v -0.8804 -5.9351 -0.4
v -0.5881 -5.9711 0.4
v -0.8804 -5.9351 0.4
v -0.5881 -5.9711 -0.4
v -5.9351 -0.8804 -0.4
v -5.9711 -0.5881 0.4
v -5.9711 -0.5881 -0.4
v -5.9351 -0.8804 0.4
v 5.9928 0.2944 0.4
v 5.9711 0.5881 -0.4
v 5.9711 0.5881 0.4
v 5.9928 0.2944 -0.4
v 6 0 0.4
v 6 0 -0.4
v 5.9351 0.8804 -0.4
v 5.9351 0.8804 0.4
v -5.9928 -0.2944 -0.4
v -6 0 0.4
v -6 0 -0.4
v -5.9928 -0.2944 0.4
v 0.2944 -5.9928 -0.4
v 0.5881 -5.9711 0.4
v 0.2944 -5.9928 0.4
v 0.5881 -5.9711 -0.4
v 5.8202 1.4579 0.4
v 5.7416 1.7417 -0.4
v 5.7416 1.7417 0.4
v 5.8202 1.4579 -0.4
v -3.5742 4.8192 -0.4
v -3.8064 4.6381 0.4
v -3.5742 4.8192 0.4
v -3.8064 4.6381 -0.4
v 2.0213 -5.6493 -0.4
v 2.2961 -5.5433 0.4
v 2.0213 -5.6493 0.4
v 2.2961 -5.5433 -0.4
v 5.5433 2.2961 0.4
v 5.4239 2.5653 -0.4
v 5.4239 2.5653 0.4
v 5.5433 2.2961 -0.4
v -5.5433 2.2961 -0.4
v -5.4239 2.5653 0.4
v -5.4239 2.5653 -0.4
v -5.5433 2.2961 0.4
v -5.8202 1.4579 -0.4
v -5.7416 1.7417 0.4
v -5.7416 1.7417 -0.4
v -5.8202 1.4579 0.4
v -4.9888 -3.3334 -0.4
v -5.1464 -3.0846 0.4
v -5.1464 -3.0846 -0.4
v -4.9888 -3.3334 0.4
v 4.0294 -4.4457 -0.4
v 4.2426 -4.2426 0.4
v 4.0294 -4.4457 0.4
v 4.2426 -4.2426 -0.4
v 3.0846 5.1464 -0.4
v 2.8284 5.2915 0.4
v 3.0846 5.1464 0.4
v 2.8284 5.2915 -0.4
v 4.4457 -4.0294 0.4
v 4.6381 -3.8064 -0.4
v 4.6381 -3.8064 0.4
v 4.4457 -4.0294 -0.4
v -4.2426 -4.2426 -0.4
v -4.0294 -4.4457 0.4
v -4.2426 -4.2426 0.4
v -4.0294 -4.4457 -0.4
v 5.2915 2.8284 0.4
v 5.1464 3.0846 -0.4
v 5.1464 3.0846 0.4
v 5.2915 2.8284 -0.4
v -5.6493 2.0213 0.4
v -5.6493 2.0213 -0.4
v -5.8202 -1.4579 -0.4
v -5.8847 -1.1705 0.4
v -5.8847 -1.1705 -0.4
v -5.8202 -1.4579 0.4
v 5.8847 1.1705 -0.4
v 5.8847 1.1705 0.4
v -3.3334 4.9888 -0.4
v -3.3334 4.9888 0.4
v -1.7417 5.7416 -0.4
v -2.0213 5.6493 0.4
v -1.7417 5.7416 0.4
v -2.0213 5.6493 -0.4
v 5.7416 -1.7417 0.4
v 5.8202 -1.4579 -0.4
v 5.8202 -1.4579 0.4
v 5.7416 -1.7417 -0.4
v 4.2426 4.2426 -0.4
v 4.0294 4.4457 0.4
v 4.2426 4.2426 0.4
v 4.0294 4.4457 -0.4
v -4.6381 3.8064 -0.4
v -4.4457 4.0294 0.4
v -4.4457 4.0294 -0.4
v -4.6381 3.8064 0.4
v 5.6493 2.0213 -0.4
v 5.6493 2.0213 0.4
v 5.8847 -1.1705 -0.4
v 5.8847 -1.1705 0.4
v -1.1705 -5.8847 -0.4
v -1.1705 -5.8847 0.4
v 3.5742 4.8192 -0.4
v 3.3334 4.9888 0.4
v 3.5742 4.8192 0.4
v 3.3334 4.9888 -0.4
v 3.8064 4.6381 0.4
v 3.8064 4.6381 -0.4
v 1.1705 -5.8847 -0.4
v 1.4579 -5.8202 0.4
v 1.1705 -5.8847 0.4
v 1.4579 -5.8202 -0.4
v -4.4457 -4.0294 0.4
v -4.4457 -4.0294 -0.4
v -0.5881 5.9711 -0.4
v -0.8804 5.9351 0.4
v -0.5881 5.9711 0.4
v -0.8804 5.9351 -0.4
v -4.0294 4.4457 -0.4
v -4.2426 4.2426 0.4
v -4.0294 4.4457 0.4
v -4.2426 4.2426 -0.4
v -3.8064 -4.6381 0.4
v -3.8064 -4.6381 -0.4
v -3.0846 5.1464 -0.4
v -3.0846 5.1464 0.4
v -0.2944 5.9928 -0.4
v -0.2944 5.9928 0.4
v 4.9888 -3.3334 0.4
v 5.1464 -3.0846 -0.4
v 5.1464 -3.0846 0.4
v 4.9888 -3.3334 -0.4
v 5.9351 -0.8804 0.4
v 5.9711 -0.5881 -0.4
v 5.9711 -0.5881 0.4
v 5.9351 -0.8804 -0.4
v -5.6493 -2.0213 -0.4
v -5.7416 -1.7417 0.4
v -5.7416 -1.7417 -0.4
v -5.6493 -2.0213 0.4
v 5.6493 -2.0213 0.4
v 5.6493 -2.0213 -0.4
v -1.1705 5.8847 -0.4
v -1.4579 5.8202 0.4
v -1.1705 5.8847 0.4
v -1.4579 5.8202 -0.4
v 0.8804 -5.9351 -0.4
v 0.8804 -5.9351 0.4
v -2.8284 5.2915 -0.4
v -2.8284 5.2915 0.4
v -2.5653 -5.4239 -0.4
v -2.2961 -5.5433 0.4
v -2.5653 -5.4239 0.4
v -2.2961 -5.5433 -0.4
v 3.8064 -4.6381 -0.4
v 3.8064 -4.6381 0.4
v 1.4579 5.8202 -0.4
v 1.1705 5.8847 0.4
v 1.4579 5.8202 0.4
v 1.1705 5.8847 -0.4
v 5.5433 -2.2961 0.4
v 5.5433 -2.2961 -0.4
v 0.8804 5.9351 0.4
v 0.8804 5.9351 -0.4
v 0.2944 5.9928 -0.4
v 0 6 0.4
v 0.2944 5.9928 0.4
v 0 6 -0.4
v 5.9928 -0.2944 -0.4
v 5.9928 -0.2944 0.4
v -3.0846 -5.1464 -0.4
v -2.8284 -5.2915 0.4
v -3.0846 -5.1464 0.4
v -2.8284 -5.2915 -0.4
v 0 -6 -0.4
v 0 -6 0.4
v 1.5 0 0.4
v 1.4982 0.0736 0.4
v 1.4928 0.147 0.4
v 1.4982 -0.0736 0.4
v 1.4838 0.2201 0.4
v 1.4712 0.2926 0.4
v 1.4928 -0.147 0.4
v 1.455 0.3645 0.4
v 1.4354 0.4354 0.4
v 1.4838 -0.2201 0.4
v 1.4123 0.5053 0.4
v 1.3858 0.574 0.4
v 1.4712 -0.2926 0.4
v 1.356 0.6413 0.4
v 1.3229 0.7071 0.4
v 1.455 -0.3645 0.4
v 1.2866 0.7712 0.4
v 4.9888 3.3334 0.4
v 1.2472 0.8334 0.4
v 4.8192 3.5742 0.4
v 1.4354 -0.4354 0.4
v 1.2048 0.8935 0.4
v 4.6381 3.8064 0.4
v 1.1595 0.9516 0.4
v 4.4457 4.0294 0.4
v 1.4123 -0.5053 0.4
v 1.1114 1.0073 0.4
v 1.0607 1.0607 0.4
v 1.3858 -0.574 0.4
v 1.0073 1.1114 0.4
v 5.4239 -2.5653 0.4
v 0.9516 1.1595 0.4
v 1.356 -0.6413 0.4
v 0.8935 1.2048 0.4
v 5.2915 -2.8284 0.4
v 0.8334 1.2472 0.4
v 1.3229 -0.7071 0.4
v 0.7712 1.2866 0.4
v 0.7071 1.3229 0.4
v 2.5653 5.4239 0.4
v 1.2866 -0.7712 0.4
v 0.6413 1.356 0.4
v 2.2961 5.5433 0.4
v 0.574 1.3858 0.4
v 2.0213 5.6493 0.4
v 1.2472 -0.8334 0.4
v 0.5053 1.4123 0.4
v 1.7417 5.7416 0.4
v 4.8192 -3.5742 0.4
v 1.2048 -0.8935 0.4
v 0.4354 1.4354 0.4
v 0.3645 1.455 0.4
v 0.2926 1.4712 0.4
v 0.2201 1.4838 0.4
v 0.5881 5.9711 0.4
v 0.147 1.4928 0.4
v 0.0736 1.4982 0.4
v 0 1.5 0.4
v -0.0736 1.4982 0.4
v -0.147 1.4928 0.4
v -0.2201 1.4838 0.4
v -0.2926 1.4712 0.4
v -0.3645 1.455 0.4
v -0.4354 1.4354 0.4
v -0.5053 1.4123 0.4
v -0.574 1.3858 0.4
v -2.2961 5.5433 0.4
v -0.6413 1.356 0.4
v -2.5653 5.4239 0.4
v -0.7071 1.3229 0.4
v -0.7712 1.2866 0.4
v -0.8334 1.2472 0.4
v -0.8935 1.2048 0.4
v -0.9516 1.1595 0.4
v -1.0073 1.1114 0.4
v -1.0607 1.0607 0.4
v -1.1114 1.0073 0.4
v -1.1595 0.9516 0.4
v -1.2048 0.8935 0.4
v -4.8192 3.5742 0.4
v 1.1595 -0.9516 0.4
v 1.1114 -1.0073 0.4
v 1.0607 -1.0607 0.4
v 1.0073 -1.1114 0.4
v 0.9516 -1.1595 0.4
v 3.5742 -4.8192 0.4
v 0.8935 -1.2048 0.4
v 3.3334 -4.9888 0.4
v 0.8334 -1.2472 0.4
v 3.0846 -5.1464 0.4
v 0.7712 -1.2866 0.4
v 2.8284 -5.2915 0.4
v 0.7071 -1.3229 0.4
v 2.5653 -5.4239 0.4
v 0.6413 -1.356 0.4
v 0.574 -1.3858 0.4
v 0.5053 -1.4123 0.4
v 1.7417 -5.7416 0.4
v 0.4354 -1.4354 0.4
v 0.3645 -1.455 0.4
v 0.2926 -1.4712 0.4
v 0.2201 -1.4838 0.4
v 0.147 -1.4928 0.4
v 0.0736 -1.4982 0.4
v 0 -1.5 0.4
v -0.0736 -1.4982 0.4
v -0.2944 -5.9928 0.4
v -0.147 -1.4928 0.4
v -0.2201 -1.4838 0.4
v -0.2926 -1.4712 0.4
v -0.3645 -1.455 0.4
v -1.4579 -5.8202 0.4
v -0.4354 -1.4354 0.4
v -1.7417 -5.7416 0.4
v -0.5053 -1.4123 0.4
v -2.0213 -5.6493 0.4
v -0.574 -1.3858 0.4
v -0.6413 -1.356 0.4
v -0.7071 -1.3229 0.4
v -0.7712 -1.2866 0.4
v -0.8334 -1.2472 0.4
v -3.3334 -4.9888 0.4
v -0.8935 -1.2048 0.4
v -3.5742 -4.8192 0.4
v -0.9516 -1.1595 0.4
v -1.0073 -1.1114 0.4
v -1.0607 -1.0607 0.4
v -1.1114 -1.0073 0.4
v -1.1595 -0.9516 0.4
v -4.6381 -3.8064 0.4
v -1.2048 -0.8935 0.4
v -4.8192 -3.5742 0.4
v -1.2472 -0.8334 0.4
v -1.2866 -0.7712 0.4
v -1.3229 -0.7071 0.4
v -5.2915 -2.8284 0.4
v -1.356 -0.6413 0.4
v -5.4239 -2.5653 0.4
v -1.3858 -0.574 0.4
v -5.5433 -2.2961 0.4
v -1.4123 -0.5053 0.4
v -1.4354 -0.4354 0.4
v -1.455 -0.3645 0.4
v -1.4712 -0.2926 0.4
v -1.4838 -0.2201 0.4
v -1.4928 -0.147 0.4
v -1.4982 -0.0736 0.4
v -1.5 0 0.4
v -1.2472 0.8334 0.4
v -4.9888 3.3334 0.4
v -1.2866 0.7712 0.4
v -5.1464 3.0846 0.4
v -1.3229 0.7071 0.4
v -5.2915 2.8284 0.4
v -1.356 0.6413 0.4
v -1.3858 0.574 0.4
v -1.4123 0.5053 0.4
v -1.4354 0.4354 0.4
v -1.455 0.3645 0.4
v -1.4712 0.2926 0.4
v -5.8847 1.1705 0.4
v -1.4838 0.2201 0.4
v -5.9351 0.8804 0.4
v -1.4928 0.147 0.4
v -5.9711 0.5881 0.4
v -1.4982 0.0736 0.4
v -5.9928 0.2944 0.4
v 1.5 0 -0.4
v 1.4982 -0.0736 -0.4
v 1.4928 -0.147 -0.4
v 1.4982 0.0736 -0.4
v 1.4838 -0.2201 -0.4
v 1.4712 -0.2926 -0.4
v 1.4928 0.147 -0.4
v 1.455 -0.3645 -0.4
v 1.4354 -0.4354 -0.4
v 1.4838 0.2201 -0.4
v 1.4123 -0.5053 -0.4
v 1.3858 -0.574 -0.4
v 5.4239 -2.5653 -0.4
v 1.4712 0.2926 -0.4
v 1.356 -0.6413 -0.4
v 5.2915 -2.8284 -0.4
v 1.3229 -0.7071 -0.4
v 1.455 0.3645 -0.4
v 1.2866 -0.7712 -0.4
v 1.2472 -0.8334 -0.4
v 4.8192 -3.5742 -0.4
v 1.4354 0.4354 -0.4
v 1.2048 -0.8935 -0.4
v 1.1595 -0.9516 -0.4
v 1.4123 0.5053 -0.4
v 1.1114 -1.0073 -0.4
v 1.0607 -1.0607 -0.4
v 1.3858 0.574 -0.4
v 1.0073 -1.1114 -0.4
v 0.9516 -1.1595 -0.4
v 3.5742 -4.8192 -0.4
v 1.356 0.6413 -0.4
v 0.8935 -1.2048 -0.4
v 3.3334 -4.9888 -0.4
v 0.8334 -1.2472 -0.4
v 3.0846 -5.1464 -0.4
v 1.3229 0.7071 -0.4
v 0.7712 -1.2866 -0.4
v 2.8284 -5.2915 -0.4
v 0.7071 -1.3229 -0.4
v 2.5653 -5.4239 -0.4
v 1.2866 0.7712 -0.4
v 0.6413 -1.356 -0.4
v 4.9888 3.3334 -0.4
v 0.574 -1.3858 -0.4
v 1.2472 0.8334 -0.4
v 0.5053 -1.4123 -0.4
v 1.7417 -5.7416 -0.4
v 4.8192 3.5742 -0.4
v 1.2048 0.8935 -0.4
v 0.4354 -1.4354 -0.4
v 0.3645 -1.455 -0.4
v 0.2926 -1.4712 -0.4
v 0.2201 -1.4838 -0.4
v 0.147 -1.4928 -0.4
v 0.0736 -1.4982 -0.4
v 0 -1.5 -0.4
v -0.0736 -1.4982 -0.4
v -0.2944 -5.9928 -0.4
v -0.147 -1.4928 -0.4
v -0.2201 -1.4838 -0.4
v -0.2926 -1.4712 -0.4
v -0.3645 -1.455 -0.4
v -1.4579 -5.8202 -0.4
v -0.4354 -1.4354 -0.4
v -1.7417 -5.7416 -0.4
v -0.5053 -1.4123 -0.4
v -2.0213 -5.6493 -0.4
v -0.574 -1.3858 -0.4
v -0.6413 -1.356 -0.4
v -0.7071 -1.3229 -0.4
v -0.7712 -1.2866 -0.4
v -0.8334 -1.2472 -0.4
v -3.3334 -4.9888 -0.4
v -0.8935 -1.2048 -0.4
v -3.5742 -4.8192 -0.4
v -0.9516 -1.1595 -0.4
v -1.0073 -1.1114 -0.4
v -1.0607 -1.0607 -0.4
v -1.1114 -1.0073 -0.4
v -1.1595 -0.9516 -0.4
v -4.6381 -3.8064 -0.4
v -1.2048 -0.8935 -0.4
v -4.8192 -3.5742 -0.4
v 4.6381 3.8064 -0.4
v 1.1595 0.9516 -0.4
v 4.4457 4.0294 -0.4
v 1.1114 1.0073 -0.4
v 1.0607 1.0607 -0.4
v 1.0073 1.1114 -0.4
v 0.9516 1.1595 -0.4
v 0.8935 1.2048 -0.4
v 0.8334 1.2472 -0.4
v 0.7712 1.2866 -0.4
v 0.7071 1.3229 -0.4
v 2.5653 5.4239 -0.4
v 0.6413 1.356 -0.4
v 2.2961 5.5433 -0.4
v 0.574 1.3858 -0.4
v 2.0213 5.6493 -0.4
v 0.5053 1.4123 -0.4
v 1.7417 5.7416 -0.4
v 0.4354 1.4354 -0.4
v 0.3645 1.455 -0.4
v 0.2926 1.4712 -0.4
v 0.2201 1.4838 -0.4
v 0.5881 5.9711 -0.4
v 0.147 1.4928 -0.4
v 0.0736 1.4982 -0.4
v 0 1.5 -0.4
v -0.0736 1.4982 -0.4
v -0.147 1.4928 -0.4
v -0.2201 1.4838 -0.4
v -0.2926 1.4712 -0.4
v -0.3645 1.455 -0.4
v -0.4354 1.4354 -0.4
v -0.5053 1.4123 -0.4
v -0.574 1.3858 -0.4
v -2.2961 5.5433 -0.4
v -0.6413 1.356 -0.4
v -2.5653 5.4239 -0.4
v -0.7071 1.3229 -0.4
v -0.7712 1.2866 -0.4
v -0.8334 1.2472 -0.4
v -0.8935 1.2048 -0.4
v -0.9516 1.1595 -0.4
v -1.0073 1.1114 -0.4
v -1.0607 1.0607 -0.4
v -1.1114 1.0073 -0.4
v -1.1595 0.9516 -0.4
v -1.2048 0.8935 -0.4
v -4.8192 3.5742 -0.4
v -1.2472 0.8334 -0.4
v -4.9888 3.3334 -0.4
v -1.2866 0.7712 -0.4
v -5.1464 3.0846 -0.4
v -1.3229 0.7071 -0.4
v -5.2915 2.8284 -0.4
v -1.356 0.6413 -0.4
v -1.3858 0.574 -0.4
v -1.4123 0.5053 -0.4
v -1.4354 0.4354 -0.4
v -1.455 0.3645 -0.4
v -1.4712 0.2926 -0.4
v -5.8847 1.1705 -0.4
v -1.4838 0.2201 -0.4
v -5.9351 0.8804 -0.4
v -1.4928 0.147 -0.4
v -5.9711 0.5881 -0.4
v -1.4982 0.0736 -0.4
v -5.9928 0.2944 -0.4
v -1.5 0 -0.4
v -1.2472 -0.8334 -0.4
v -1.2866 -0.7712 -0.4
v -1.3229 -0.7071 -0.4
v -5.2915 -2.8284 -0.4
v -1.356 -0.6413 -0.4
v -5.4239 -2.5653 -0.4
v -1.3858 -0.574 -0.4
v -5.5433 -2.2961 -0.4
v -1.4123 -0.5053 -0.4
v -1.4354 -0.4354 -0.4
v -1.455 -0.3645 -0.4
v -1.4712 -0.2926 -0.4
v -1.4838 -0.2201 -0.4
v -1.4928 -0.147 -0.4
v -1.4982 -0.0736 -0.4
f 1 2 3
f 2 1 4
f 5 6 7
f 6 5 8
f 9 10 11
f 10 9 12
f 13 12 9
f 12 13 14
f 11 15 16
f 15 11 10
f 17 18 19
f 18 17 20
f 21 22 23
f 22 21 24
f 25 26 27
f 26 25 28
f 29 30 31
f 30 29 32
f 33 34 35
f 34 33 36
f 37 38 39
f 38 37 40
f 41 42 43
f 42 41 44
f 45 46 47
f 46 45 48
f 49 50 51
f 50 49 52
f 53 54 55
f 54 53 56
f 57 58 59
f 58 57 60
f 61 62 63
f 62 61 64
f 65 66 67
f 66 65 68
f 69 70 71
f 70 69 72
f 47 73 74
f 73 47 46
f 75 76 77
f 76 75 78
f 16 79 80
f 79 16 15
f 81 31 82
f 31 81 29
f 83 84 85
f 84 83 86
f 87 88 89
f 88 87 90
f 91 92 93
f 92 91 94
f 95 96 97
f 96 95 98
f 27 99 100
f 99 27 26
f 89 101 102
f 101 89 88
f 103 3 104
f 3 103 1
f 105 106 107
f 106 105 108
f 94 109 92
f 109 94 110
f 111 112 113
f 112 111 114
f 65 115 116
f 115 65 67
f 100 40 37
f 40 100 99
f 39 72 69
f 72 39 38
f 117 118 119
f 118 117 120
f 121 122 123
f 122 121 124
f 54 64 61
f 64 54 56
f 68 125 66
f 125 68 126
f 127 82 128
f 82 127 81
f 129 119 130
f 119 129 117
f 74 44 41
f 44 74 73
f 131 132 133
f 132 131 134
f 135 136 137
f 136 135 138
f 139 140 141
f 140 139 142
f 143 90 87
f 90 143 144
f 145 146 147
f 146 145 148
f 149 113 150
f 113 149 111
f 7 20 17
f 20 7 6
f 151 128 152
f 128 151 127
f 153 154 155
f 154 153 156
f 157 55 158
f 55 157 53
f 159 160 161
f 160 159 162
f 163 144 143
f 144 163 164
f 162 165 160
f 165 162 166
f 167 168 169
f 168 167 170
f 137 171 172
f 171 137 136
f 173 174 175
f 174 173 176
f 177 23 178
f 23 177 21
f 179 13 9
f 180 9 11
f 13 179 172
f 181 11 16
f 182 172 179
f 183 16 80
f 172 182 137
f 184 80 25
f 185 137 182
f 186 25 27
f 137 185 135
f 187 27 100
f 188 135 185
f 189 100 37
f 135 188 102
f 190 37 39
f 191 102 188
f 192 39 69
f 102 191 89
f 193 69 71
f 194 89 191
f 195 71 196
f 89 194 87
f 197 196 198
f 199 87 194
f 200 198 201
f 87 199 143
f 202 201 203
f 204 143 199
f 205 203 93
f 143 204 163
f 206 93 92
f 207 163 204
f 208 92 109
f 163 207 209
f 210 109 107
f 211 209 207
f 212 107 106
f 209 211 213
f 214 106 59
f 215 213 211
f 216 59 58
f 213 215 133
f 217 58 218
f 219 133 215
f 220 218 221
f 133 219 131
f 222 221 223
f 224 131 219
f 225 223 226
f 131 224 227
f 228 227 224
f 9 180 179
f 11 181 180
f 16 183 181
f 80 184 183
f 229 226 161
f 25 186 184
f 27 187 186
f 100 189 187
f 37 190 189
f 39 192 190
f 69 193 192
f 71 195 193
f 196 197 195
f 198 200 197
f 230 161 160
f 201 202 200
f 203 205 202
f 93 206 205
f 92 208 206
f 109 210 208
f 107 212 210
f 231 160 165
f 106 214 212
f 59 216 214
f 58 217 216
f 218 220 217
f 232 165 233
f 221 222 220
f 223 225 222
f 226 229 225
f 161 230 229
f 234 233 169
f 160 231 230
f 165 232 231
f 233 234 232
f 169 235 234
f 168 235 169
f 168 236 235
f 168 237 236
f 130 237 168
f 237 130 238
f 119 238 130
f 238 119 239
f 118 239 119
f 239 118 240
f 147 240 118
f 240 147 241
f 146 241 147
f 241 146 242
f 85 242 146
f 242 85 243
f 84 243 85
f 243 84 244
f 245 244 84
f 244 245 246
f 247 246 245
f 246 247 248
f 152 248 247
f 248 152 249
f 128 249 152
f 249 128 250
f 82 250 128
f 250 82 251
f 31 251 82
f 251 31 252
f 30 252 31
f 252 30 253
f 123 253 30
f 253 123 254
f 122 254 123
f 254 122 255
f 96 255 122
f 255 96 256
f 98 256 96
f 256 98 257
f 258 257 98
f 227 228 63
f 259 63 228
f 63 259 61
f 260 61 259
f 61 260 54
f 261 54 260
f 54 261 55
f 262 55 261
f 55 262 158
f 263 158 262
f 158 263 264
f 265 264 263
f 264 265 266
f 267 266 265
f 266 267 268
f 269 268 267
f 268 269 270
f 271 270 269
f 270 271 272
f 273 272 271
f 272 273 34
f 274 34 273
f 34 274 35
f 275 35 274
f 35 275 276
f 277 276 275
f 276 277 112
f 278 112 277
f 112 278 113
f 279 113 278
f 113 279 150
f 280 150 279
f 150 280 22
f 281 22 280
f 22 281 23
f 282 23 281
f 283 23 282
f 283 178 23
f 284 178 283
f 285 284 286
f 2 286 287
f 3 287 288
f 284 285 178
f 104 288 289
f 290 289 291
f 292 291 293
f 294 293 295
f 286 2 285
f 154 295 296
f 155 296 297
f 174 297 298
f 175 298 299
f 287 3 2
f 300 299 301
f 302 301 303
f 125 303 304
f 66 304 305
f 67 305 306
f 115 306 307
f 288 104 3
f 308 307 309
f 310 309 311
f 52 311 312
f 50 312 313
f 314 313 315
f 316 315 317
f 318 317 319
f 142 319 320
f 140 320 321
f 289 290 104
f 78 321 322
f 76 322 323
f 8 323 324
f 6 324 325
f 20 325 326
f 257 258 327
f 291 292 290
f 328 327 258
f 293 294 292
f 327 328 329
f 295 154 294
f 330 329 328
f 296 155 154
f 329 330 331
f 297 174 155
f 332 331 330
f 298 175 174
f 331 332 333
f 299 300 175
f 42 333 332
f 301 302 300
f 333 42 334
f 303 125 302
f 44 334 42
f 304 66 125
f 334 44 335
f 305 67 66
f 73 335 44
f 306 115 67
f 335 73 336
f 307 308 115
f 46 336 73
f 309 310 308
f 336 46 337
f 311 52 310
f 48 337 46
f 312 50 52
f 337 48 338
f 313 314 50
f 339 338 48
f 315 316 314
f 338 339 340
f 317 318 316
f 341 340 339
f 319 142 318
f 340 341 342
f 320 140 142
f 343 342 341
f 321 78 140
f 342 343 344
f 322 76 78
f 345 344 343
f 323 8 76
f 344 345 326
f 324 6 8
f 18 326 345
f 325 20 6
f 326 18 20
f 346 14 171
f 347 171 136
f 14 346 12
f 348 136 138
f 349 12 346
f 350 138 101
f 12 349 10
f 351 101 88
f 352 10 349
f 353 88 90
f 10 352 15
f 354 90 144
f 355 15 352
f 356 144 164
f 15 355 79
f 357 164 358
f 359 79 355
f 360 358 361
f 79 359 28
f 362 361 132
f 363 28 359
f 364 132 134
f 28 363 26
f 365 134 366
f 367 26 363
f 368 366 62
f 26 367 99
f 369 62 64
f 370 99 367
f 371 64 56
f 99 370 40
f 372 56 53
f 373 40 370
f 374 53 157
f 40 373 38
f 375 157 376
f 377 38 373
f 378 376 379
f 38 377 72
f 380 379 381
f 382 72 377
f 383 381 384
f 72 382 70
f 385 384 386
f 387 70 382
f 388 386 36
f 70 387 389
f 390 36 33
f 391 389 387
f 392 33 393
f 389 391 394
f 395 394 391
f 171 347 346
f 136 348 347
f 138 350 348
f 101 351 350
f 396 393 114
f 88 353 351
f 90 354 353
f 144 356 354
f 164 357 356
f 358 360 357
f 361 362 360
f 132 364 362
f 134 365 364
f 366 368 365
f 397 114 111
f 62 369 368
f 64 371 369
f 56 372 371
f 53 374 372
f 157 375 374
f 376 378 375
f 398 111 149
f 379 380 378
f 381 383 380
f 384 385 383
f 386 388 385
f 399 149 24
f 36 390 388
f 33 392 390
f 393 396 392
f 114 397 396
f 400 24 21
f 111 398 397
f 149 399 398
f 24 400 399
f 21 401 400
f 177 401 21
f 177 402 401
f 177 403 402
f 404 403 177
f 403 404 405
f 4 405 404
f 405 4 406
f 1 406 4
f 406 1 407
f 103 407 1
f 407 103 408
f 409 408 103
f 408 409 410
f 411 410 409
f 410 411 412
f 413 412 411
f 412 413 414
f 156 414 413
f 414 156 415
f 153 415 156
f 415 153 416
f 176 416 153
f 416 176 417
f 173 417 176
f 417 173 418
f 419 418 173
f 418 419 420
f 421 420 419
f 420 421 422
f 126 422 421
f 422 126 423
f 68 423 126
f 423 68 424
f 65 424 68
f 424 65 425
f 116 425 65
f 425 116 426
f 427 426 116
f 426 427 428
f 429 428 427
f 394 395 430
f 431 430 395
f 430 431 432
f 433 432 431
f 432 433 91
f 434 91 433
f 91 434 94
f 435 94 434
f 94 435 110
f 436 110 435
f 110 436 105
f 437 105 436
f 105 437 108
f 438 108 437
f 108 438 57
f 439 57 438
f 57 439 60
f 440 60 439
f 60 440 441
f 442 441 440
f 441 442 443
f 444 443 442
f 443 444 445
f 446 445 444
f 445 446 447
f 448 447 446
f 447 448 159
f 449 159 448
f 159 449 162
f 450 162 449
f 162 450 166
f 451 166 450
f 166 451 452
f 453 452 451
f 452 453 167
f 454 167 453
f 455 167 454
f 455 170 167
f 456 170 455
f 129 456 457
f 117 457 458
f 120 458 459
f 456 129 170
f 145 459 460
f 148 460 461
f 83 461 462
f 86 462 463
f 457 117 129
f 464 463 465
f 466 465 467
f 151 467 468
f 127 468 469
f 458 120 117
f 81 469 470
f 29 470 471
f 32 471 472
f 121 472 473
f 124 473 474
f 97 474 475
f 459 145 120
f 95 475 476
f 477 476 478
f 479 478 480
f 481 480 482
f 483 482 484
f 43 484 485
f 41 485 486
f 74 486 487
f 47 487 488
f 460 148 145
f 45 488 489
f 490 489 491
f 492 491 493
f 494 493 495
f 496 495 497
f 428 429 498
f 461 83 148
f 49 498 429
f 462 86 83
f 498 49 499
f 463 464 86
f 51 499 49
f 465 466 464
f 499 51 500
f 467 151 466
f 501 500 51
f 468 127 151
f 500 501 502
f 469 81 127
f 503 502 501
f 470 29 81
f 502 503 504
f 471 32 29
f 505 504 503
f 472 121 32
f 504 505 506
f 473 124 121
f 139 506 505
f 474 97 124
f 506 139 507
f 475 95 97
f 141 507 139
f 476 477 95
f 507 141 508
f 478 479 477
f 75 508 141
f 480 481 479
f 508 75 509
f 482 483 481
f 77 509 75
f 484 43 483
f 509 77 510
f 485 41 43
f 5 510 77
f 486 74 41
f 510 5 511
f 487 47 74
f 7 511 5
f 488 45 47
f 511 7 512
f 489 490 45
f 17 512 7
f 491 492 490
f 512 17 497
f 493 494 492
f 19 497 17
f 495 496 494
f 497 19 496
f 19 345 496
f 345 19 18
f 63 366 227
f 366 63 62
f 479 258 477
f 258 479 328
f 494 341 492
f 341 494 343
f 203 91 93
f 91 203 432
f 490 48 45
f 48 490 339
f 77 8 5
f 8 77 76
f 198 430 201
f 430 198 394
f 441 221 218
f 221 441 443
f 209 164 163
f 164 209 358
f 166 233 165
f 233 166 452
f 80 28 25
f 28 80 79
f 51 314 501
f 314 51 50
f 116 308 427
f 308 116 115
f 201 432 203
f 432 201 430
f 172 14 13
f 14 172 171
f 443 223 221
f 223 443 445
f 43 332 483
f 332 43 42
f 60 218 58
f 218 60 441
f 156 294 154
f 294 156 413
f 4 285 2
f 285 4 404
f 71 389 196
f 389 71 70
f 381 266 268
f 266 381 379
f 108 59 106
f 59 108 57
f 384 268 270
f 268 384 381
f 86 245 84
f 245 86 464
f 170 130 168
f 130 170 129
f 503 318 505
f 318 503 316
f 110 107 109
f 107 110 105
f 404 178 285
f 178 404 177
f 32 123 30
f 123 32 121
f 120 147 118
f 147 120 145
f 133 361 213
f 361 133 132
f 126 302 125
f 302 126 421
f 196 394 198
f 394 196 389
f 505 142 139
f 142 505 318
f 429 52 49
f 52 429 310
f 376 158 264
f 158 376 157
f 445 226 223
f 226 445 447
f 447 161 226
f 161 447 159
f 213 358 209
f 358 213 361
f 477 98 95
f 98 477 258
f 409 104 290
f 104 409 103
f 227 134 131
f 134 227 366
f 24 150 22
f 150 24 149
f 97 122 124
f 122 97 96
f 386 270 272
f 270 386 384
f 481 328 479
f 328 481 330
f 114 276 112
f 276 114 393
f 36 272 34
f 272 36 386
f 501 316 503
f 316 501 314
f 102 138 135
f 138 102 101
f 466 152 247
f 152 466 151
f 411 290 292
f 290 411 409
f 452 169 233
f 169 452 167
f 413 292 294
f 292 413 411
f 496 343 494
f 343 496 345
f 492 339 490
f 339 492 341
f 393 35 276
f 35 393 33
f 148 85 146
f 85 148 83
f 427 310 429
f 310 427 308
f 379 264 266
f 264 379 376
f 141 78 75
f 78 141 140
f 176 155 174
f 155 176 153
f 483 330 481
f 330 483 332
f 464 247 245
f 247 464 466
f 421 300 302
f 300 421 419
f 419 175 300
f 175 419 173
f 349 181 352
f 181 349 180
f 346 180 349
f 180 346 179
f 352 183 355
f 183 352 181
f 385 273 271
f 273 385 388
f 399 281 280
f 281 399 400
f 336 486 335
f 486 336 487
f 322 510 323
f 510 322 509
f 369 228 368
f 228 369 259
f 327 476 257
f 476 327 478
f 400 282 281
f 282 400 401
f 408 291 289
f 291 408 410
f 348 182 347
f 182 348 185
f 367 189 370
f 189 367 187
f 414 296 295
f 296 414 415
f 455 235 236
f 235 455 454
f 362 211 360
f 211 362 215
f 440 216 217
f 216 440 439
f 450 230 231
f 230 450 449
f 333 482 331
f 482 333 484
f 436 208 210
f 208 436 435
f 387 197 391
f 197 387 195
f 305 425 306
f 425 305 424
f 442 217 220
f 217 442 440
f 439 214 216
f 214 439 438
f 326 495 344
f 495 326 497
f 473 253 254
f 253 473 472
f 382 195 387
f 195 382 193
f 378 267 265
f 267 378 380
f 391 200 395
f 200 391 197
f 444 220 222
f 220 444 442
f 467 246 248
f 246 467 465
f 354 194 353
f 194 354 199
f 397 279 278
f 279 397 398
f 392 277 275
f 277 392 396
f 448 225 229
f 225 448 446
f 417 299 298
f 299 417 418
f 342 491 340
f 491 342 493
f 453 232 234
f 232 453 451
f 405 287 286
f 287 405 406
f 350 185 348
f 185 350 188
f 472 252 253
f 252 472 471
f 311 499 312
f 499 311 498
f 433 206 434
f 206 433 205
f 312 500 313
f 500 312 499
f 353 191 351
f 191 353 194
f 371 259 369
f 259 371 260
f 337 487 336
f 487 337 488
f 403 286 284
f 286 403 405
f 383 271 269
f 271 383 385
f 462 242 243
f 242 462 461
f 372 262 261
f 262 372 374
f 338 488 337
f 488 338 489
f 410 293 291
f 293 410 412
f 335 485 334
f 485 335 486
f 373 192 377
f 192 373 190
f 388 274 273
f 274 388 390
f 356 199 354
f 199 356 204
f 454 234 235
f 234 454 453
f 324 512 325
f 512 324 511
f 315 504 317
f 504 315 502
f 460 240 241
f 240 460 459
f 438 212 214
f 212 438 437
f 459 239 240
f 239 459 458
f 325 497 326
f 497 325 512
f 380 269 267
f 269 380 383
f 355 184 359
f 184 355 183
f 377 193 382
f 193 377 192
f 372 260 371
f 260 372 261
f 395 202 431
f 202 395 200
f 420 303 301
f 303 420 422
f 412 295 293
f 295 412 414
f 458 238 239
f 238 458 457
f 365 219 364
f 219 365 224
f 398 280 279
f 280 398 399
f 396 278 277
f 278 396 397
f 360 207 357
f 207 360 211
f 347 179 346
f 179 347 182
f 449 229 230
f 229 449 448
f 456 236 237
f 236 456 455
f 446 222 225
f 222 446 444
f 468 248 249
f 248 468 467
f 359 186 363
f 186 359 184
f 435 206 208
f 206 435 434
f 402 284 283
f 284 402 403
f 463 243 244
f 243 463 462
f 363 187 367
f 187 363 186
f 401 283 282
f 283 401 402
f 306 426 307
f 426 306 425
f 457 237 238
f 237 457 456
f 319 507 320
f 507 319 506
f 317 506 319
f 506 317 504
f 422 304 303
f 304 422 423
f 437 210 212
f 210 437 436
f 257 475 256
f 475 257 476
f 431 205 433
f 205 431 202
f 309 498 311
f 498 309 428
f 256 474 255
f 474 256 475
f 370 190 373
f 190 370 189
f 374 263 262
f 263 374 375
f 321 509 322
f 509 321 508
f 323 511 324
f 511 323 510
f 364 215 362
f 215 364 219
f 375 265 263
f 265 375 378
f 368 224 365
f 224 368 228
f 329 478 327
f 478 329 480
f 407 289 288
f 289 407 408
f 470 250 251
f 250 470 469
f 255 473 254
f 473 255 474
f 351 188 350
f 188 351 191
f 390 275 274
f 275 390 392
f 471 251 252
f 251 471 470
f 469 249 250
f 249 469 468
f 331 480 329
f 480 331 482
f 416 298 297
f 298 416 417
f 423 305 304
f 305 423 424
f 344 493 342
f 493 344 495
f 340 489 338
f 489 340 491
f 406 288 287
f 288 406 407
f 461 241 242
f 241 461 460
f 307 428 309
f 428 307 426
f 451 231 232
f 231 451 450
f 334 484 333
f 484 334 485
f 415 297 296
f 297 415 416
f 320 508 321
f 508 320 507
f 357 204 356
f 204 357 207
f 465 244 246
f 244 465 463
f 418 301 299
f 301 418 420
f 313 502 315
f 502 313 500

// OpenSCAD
$fn=128;

module penny_washer(id=3.0, od=12.0, thickness=0.8) {
    difference() {
        cylinder(h=thickness, d=od, center=true);
        cylinder(h=thickness+0.2, d=id, center=true);
    }
}

penny_washer();
